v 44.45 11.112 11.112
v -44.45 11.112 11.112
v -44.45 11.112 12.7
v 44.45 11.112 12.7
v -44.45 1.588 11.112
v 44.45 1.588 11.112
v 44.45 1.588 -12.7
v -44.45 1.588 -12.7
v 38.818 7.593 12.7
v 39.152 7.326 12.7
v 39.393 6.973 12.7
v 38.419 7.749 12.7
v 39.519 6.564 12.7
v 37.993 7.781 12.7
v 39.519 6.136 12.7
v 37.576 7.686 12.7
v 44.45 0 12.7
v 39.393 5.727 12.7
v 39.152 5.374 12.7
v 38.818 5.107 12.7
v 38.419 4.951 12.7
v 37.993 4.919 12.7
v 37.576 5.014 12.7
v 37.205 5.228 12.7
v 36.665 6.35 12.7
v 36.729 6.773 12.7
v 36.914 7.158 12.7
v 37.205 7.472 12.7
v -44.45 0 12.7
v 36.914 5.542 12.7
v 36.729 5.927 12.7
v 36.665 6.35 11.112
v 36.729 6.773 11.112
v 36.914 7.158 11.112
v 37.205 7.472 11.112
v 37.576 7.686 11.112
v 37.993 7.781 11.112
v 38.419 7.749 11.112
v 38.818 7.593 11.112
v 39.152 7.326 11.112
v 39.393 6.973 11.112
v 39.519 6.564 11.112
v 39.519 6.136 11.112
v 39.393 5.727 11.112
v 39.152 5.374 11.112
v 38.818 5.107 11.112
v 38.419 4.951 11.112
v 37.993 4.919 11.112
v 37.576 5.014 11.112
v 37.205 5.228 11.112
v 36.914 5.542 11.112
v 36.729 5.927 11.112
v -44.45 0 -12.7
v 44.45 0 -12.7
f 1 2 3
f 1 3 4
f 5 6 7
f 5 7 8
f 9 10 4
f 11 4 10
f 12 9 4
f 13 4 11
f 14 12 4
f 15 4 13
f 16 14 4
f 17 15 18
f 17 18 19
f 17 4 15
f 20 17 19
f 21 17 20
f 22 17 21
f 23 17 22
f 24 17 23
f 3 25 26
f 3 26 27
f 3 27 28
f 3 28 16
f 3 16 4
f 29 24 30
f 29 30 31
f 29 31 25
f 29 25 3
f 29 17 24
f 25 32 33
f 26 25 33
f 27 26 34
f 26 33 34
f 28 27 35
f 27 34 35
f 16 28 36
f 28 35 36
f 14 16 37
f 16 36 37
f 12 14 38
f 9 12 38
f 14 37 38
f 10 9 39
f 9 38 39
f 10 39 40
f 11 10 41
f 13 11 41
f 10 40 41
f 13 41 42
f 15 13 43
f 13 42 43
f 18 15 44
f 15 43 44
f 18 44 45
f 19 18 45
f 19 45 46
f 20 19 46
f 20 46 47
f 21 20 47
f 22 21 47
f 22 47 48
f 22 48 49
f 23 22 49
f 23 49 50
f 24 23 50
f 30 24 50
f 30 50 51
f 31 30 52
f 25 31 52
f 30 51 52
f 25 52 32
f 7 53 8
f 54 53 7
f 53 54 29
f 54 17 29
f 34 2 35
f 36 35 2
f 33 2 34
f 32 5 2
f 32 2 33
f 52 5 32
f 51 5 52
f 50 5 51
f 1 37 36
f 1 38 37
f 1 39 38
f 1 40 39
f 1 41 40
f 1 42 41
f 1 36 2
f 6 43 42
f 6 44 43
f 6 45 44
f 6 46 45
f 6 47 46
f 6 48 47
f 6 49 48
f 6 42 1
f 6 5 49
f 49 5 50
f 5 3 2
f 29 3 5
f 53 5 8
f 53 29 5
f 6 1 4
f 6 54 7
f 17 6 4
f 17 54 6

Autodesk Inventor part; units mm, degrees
ref_plane "YZ Plane" through (0, 0, 0) normal (1, 0, 0) x (0, 1, 0)
ref_plane "XZ Plane" through (0, 0, 0) normal (0, 1, 0) x (-1, 0, 0)
ref_plane "XY Plane" through (0, 0, 0) normal (0, 0, 1) x (1, 0, 0)
sketch "Sketch1" plane through (0, 0, 0) normal (0, 1, 0) x (-1, 0, 0)
  line L0 (-44.45, 12.7) -> (44.45, 12.7)
  line L1 (44.45, 12.7) -> (44.45, -12.7)
  line L2 (44.45, -12.7) -> (-44.45, -12.7)
  line L3 (-44.45, -12.7) -> (-44.45, 12.7)
  line L4 (-44.45, 12.7) -> (44.45, -12.7) construction
  line L5 (44.45, 12.7) -> (-44.45, -12.7) construction
  point P0 (0, 0)
  dimension "d0" = 88.9
  dimension "d1" = 25.4
extrude "Extrusion1" add sketch "Sketch1" along normal blind 1.5875
sketch "Sketch2" plane through (0, 1.5875, 0) normal (0, 1, 0) x (1, 0, 0)
  line L0 (-44.45, -12.7) -> (44.45, -12.7) projected
  line L1 (-44.45, -12.7) -> (-44.45, -11.1125)
  line L2 (-44.45, 12.7) -> (-44.45, -12.7) projected
  line L3 (-44.45, -11.1125) -> (44.45, -11.1125)
  line L4 (44.45, -11.1125) -> (44.45, -12.7)
  line L5 (44.45, -12.7) -> (-44.45, -12.7)
  line L6 (-44.45, -12.7) -> (-44.45, -11.1125)
  point P0 (0, 0)
  dimension "d4" = 1.5875
extrude "Extrusion2" add sketch "Sketch2" along normal blind 9.525
sketch "Sketch3" plane through (44.45, 1.5875, 11.1125) normal (0, 0, -1) x (-1, 0, 0)
  line L0 (0, -1.5875) -> (0, 9.525) projected
  line L1 (0, 9.525) -> (6.35, 9.525)
  line L2 (88.9, 9.525) -> (0, 9.525) projected
  line L3 (88.9, 0) -> (0, 0) projected
  line L4 (88.9, 0) -> (88.9, 9.525) projected
  line L5 (0, 9.525) -> (88.9, 9.525) projected
  line L6 (0, 0) -> (0, 9.525) projected
  line L7 (0, 0) -> (88.9, 0) projected
  line L8 (6.35, 9.525) -> (6.35, 4.7625)
  circle A0 centre (6.35, 4.7625) radius 1.4351
  point P0 (44.45, -1.5875)
  dimension "d7" = 6.35
  dimension "d8" = 2.8702
extrude "Extrusion3" cut sketch "Sketch3" against normal through all contours A0
properties part number "Switch-Panel-Divider"
